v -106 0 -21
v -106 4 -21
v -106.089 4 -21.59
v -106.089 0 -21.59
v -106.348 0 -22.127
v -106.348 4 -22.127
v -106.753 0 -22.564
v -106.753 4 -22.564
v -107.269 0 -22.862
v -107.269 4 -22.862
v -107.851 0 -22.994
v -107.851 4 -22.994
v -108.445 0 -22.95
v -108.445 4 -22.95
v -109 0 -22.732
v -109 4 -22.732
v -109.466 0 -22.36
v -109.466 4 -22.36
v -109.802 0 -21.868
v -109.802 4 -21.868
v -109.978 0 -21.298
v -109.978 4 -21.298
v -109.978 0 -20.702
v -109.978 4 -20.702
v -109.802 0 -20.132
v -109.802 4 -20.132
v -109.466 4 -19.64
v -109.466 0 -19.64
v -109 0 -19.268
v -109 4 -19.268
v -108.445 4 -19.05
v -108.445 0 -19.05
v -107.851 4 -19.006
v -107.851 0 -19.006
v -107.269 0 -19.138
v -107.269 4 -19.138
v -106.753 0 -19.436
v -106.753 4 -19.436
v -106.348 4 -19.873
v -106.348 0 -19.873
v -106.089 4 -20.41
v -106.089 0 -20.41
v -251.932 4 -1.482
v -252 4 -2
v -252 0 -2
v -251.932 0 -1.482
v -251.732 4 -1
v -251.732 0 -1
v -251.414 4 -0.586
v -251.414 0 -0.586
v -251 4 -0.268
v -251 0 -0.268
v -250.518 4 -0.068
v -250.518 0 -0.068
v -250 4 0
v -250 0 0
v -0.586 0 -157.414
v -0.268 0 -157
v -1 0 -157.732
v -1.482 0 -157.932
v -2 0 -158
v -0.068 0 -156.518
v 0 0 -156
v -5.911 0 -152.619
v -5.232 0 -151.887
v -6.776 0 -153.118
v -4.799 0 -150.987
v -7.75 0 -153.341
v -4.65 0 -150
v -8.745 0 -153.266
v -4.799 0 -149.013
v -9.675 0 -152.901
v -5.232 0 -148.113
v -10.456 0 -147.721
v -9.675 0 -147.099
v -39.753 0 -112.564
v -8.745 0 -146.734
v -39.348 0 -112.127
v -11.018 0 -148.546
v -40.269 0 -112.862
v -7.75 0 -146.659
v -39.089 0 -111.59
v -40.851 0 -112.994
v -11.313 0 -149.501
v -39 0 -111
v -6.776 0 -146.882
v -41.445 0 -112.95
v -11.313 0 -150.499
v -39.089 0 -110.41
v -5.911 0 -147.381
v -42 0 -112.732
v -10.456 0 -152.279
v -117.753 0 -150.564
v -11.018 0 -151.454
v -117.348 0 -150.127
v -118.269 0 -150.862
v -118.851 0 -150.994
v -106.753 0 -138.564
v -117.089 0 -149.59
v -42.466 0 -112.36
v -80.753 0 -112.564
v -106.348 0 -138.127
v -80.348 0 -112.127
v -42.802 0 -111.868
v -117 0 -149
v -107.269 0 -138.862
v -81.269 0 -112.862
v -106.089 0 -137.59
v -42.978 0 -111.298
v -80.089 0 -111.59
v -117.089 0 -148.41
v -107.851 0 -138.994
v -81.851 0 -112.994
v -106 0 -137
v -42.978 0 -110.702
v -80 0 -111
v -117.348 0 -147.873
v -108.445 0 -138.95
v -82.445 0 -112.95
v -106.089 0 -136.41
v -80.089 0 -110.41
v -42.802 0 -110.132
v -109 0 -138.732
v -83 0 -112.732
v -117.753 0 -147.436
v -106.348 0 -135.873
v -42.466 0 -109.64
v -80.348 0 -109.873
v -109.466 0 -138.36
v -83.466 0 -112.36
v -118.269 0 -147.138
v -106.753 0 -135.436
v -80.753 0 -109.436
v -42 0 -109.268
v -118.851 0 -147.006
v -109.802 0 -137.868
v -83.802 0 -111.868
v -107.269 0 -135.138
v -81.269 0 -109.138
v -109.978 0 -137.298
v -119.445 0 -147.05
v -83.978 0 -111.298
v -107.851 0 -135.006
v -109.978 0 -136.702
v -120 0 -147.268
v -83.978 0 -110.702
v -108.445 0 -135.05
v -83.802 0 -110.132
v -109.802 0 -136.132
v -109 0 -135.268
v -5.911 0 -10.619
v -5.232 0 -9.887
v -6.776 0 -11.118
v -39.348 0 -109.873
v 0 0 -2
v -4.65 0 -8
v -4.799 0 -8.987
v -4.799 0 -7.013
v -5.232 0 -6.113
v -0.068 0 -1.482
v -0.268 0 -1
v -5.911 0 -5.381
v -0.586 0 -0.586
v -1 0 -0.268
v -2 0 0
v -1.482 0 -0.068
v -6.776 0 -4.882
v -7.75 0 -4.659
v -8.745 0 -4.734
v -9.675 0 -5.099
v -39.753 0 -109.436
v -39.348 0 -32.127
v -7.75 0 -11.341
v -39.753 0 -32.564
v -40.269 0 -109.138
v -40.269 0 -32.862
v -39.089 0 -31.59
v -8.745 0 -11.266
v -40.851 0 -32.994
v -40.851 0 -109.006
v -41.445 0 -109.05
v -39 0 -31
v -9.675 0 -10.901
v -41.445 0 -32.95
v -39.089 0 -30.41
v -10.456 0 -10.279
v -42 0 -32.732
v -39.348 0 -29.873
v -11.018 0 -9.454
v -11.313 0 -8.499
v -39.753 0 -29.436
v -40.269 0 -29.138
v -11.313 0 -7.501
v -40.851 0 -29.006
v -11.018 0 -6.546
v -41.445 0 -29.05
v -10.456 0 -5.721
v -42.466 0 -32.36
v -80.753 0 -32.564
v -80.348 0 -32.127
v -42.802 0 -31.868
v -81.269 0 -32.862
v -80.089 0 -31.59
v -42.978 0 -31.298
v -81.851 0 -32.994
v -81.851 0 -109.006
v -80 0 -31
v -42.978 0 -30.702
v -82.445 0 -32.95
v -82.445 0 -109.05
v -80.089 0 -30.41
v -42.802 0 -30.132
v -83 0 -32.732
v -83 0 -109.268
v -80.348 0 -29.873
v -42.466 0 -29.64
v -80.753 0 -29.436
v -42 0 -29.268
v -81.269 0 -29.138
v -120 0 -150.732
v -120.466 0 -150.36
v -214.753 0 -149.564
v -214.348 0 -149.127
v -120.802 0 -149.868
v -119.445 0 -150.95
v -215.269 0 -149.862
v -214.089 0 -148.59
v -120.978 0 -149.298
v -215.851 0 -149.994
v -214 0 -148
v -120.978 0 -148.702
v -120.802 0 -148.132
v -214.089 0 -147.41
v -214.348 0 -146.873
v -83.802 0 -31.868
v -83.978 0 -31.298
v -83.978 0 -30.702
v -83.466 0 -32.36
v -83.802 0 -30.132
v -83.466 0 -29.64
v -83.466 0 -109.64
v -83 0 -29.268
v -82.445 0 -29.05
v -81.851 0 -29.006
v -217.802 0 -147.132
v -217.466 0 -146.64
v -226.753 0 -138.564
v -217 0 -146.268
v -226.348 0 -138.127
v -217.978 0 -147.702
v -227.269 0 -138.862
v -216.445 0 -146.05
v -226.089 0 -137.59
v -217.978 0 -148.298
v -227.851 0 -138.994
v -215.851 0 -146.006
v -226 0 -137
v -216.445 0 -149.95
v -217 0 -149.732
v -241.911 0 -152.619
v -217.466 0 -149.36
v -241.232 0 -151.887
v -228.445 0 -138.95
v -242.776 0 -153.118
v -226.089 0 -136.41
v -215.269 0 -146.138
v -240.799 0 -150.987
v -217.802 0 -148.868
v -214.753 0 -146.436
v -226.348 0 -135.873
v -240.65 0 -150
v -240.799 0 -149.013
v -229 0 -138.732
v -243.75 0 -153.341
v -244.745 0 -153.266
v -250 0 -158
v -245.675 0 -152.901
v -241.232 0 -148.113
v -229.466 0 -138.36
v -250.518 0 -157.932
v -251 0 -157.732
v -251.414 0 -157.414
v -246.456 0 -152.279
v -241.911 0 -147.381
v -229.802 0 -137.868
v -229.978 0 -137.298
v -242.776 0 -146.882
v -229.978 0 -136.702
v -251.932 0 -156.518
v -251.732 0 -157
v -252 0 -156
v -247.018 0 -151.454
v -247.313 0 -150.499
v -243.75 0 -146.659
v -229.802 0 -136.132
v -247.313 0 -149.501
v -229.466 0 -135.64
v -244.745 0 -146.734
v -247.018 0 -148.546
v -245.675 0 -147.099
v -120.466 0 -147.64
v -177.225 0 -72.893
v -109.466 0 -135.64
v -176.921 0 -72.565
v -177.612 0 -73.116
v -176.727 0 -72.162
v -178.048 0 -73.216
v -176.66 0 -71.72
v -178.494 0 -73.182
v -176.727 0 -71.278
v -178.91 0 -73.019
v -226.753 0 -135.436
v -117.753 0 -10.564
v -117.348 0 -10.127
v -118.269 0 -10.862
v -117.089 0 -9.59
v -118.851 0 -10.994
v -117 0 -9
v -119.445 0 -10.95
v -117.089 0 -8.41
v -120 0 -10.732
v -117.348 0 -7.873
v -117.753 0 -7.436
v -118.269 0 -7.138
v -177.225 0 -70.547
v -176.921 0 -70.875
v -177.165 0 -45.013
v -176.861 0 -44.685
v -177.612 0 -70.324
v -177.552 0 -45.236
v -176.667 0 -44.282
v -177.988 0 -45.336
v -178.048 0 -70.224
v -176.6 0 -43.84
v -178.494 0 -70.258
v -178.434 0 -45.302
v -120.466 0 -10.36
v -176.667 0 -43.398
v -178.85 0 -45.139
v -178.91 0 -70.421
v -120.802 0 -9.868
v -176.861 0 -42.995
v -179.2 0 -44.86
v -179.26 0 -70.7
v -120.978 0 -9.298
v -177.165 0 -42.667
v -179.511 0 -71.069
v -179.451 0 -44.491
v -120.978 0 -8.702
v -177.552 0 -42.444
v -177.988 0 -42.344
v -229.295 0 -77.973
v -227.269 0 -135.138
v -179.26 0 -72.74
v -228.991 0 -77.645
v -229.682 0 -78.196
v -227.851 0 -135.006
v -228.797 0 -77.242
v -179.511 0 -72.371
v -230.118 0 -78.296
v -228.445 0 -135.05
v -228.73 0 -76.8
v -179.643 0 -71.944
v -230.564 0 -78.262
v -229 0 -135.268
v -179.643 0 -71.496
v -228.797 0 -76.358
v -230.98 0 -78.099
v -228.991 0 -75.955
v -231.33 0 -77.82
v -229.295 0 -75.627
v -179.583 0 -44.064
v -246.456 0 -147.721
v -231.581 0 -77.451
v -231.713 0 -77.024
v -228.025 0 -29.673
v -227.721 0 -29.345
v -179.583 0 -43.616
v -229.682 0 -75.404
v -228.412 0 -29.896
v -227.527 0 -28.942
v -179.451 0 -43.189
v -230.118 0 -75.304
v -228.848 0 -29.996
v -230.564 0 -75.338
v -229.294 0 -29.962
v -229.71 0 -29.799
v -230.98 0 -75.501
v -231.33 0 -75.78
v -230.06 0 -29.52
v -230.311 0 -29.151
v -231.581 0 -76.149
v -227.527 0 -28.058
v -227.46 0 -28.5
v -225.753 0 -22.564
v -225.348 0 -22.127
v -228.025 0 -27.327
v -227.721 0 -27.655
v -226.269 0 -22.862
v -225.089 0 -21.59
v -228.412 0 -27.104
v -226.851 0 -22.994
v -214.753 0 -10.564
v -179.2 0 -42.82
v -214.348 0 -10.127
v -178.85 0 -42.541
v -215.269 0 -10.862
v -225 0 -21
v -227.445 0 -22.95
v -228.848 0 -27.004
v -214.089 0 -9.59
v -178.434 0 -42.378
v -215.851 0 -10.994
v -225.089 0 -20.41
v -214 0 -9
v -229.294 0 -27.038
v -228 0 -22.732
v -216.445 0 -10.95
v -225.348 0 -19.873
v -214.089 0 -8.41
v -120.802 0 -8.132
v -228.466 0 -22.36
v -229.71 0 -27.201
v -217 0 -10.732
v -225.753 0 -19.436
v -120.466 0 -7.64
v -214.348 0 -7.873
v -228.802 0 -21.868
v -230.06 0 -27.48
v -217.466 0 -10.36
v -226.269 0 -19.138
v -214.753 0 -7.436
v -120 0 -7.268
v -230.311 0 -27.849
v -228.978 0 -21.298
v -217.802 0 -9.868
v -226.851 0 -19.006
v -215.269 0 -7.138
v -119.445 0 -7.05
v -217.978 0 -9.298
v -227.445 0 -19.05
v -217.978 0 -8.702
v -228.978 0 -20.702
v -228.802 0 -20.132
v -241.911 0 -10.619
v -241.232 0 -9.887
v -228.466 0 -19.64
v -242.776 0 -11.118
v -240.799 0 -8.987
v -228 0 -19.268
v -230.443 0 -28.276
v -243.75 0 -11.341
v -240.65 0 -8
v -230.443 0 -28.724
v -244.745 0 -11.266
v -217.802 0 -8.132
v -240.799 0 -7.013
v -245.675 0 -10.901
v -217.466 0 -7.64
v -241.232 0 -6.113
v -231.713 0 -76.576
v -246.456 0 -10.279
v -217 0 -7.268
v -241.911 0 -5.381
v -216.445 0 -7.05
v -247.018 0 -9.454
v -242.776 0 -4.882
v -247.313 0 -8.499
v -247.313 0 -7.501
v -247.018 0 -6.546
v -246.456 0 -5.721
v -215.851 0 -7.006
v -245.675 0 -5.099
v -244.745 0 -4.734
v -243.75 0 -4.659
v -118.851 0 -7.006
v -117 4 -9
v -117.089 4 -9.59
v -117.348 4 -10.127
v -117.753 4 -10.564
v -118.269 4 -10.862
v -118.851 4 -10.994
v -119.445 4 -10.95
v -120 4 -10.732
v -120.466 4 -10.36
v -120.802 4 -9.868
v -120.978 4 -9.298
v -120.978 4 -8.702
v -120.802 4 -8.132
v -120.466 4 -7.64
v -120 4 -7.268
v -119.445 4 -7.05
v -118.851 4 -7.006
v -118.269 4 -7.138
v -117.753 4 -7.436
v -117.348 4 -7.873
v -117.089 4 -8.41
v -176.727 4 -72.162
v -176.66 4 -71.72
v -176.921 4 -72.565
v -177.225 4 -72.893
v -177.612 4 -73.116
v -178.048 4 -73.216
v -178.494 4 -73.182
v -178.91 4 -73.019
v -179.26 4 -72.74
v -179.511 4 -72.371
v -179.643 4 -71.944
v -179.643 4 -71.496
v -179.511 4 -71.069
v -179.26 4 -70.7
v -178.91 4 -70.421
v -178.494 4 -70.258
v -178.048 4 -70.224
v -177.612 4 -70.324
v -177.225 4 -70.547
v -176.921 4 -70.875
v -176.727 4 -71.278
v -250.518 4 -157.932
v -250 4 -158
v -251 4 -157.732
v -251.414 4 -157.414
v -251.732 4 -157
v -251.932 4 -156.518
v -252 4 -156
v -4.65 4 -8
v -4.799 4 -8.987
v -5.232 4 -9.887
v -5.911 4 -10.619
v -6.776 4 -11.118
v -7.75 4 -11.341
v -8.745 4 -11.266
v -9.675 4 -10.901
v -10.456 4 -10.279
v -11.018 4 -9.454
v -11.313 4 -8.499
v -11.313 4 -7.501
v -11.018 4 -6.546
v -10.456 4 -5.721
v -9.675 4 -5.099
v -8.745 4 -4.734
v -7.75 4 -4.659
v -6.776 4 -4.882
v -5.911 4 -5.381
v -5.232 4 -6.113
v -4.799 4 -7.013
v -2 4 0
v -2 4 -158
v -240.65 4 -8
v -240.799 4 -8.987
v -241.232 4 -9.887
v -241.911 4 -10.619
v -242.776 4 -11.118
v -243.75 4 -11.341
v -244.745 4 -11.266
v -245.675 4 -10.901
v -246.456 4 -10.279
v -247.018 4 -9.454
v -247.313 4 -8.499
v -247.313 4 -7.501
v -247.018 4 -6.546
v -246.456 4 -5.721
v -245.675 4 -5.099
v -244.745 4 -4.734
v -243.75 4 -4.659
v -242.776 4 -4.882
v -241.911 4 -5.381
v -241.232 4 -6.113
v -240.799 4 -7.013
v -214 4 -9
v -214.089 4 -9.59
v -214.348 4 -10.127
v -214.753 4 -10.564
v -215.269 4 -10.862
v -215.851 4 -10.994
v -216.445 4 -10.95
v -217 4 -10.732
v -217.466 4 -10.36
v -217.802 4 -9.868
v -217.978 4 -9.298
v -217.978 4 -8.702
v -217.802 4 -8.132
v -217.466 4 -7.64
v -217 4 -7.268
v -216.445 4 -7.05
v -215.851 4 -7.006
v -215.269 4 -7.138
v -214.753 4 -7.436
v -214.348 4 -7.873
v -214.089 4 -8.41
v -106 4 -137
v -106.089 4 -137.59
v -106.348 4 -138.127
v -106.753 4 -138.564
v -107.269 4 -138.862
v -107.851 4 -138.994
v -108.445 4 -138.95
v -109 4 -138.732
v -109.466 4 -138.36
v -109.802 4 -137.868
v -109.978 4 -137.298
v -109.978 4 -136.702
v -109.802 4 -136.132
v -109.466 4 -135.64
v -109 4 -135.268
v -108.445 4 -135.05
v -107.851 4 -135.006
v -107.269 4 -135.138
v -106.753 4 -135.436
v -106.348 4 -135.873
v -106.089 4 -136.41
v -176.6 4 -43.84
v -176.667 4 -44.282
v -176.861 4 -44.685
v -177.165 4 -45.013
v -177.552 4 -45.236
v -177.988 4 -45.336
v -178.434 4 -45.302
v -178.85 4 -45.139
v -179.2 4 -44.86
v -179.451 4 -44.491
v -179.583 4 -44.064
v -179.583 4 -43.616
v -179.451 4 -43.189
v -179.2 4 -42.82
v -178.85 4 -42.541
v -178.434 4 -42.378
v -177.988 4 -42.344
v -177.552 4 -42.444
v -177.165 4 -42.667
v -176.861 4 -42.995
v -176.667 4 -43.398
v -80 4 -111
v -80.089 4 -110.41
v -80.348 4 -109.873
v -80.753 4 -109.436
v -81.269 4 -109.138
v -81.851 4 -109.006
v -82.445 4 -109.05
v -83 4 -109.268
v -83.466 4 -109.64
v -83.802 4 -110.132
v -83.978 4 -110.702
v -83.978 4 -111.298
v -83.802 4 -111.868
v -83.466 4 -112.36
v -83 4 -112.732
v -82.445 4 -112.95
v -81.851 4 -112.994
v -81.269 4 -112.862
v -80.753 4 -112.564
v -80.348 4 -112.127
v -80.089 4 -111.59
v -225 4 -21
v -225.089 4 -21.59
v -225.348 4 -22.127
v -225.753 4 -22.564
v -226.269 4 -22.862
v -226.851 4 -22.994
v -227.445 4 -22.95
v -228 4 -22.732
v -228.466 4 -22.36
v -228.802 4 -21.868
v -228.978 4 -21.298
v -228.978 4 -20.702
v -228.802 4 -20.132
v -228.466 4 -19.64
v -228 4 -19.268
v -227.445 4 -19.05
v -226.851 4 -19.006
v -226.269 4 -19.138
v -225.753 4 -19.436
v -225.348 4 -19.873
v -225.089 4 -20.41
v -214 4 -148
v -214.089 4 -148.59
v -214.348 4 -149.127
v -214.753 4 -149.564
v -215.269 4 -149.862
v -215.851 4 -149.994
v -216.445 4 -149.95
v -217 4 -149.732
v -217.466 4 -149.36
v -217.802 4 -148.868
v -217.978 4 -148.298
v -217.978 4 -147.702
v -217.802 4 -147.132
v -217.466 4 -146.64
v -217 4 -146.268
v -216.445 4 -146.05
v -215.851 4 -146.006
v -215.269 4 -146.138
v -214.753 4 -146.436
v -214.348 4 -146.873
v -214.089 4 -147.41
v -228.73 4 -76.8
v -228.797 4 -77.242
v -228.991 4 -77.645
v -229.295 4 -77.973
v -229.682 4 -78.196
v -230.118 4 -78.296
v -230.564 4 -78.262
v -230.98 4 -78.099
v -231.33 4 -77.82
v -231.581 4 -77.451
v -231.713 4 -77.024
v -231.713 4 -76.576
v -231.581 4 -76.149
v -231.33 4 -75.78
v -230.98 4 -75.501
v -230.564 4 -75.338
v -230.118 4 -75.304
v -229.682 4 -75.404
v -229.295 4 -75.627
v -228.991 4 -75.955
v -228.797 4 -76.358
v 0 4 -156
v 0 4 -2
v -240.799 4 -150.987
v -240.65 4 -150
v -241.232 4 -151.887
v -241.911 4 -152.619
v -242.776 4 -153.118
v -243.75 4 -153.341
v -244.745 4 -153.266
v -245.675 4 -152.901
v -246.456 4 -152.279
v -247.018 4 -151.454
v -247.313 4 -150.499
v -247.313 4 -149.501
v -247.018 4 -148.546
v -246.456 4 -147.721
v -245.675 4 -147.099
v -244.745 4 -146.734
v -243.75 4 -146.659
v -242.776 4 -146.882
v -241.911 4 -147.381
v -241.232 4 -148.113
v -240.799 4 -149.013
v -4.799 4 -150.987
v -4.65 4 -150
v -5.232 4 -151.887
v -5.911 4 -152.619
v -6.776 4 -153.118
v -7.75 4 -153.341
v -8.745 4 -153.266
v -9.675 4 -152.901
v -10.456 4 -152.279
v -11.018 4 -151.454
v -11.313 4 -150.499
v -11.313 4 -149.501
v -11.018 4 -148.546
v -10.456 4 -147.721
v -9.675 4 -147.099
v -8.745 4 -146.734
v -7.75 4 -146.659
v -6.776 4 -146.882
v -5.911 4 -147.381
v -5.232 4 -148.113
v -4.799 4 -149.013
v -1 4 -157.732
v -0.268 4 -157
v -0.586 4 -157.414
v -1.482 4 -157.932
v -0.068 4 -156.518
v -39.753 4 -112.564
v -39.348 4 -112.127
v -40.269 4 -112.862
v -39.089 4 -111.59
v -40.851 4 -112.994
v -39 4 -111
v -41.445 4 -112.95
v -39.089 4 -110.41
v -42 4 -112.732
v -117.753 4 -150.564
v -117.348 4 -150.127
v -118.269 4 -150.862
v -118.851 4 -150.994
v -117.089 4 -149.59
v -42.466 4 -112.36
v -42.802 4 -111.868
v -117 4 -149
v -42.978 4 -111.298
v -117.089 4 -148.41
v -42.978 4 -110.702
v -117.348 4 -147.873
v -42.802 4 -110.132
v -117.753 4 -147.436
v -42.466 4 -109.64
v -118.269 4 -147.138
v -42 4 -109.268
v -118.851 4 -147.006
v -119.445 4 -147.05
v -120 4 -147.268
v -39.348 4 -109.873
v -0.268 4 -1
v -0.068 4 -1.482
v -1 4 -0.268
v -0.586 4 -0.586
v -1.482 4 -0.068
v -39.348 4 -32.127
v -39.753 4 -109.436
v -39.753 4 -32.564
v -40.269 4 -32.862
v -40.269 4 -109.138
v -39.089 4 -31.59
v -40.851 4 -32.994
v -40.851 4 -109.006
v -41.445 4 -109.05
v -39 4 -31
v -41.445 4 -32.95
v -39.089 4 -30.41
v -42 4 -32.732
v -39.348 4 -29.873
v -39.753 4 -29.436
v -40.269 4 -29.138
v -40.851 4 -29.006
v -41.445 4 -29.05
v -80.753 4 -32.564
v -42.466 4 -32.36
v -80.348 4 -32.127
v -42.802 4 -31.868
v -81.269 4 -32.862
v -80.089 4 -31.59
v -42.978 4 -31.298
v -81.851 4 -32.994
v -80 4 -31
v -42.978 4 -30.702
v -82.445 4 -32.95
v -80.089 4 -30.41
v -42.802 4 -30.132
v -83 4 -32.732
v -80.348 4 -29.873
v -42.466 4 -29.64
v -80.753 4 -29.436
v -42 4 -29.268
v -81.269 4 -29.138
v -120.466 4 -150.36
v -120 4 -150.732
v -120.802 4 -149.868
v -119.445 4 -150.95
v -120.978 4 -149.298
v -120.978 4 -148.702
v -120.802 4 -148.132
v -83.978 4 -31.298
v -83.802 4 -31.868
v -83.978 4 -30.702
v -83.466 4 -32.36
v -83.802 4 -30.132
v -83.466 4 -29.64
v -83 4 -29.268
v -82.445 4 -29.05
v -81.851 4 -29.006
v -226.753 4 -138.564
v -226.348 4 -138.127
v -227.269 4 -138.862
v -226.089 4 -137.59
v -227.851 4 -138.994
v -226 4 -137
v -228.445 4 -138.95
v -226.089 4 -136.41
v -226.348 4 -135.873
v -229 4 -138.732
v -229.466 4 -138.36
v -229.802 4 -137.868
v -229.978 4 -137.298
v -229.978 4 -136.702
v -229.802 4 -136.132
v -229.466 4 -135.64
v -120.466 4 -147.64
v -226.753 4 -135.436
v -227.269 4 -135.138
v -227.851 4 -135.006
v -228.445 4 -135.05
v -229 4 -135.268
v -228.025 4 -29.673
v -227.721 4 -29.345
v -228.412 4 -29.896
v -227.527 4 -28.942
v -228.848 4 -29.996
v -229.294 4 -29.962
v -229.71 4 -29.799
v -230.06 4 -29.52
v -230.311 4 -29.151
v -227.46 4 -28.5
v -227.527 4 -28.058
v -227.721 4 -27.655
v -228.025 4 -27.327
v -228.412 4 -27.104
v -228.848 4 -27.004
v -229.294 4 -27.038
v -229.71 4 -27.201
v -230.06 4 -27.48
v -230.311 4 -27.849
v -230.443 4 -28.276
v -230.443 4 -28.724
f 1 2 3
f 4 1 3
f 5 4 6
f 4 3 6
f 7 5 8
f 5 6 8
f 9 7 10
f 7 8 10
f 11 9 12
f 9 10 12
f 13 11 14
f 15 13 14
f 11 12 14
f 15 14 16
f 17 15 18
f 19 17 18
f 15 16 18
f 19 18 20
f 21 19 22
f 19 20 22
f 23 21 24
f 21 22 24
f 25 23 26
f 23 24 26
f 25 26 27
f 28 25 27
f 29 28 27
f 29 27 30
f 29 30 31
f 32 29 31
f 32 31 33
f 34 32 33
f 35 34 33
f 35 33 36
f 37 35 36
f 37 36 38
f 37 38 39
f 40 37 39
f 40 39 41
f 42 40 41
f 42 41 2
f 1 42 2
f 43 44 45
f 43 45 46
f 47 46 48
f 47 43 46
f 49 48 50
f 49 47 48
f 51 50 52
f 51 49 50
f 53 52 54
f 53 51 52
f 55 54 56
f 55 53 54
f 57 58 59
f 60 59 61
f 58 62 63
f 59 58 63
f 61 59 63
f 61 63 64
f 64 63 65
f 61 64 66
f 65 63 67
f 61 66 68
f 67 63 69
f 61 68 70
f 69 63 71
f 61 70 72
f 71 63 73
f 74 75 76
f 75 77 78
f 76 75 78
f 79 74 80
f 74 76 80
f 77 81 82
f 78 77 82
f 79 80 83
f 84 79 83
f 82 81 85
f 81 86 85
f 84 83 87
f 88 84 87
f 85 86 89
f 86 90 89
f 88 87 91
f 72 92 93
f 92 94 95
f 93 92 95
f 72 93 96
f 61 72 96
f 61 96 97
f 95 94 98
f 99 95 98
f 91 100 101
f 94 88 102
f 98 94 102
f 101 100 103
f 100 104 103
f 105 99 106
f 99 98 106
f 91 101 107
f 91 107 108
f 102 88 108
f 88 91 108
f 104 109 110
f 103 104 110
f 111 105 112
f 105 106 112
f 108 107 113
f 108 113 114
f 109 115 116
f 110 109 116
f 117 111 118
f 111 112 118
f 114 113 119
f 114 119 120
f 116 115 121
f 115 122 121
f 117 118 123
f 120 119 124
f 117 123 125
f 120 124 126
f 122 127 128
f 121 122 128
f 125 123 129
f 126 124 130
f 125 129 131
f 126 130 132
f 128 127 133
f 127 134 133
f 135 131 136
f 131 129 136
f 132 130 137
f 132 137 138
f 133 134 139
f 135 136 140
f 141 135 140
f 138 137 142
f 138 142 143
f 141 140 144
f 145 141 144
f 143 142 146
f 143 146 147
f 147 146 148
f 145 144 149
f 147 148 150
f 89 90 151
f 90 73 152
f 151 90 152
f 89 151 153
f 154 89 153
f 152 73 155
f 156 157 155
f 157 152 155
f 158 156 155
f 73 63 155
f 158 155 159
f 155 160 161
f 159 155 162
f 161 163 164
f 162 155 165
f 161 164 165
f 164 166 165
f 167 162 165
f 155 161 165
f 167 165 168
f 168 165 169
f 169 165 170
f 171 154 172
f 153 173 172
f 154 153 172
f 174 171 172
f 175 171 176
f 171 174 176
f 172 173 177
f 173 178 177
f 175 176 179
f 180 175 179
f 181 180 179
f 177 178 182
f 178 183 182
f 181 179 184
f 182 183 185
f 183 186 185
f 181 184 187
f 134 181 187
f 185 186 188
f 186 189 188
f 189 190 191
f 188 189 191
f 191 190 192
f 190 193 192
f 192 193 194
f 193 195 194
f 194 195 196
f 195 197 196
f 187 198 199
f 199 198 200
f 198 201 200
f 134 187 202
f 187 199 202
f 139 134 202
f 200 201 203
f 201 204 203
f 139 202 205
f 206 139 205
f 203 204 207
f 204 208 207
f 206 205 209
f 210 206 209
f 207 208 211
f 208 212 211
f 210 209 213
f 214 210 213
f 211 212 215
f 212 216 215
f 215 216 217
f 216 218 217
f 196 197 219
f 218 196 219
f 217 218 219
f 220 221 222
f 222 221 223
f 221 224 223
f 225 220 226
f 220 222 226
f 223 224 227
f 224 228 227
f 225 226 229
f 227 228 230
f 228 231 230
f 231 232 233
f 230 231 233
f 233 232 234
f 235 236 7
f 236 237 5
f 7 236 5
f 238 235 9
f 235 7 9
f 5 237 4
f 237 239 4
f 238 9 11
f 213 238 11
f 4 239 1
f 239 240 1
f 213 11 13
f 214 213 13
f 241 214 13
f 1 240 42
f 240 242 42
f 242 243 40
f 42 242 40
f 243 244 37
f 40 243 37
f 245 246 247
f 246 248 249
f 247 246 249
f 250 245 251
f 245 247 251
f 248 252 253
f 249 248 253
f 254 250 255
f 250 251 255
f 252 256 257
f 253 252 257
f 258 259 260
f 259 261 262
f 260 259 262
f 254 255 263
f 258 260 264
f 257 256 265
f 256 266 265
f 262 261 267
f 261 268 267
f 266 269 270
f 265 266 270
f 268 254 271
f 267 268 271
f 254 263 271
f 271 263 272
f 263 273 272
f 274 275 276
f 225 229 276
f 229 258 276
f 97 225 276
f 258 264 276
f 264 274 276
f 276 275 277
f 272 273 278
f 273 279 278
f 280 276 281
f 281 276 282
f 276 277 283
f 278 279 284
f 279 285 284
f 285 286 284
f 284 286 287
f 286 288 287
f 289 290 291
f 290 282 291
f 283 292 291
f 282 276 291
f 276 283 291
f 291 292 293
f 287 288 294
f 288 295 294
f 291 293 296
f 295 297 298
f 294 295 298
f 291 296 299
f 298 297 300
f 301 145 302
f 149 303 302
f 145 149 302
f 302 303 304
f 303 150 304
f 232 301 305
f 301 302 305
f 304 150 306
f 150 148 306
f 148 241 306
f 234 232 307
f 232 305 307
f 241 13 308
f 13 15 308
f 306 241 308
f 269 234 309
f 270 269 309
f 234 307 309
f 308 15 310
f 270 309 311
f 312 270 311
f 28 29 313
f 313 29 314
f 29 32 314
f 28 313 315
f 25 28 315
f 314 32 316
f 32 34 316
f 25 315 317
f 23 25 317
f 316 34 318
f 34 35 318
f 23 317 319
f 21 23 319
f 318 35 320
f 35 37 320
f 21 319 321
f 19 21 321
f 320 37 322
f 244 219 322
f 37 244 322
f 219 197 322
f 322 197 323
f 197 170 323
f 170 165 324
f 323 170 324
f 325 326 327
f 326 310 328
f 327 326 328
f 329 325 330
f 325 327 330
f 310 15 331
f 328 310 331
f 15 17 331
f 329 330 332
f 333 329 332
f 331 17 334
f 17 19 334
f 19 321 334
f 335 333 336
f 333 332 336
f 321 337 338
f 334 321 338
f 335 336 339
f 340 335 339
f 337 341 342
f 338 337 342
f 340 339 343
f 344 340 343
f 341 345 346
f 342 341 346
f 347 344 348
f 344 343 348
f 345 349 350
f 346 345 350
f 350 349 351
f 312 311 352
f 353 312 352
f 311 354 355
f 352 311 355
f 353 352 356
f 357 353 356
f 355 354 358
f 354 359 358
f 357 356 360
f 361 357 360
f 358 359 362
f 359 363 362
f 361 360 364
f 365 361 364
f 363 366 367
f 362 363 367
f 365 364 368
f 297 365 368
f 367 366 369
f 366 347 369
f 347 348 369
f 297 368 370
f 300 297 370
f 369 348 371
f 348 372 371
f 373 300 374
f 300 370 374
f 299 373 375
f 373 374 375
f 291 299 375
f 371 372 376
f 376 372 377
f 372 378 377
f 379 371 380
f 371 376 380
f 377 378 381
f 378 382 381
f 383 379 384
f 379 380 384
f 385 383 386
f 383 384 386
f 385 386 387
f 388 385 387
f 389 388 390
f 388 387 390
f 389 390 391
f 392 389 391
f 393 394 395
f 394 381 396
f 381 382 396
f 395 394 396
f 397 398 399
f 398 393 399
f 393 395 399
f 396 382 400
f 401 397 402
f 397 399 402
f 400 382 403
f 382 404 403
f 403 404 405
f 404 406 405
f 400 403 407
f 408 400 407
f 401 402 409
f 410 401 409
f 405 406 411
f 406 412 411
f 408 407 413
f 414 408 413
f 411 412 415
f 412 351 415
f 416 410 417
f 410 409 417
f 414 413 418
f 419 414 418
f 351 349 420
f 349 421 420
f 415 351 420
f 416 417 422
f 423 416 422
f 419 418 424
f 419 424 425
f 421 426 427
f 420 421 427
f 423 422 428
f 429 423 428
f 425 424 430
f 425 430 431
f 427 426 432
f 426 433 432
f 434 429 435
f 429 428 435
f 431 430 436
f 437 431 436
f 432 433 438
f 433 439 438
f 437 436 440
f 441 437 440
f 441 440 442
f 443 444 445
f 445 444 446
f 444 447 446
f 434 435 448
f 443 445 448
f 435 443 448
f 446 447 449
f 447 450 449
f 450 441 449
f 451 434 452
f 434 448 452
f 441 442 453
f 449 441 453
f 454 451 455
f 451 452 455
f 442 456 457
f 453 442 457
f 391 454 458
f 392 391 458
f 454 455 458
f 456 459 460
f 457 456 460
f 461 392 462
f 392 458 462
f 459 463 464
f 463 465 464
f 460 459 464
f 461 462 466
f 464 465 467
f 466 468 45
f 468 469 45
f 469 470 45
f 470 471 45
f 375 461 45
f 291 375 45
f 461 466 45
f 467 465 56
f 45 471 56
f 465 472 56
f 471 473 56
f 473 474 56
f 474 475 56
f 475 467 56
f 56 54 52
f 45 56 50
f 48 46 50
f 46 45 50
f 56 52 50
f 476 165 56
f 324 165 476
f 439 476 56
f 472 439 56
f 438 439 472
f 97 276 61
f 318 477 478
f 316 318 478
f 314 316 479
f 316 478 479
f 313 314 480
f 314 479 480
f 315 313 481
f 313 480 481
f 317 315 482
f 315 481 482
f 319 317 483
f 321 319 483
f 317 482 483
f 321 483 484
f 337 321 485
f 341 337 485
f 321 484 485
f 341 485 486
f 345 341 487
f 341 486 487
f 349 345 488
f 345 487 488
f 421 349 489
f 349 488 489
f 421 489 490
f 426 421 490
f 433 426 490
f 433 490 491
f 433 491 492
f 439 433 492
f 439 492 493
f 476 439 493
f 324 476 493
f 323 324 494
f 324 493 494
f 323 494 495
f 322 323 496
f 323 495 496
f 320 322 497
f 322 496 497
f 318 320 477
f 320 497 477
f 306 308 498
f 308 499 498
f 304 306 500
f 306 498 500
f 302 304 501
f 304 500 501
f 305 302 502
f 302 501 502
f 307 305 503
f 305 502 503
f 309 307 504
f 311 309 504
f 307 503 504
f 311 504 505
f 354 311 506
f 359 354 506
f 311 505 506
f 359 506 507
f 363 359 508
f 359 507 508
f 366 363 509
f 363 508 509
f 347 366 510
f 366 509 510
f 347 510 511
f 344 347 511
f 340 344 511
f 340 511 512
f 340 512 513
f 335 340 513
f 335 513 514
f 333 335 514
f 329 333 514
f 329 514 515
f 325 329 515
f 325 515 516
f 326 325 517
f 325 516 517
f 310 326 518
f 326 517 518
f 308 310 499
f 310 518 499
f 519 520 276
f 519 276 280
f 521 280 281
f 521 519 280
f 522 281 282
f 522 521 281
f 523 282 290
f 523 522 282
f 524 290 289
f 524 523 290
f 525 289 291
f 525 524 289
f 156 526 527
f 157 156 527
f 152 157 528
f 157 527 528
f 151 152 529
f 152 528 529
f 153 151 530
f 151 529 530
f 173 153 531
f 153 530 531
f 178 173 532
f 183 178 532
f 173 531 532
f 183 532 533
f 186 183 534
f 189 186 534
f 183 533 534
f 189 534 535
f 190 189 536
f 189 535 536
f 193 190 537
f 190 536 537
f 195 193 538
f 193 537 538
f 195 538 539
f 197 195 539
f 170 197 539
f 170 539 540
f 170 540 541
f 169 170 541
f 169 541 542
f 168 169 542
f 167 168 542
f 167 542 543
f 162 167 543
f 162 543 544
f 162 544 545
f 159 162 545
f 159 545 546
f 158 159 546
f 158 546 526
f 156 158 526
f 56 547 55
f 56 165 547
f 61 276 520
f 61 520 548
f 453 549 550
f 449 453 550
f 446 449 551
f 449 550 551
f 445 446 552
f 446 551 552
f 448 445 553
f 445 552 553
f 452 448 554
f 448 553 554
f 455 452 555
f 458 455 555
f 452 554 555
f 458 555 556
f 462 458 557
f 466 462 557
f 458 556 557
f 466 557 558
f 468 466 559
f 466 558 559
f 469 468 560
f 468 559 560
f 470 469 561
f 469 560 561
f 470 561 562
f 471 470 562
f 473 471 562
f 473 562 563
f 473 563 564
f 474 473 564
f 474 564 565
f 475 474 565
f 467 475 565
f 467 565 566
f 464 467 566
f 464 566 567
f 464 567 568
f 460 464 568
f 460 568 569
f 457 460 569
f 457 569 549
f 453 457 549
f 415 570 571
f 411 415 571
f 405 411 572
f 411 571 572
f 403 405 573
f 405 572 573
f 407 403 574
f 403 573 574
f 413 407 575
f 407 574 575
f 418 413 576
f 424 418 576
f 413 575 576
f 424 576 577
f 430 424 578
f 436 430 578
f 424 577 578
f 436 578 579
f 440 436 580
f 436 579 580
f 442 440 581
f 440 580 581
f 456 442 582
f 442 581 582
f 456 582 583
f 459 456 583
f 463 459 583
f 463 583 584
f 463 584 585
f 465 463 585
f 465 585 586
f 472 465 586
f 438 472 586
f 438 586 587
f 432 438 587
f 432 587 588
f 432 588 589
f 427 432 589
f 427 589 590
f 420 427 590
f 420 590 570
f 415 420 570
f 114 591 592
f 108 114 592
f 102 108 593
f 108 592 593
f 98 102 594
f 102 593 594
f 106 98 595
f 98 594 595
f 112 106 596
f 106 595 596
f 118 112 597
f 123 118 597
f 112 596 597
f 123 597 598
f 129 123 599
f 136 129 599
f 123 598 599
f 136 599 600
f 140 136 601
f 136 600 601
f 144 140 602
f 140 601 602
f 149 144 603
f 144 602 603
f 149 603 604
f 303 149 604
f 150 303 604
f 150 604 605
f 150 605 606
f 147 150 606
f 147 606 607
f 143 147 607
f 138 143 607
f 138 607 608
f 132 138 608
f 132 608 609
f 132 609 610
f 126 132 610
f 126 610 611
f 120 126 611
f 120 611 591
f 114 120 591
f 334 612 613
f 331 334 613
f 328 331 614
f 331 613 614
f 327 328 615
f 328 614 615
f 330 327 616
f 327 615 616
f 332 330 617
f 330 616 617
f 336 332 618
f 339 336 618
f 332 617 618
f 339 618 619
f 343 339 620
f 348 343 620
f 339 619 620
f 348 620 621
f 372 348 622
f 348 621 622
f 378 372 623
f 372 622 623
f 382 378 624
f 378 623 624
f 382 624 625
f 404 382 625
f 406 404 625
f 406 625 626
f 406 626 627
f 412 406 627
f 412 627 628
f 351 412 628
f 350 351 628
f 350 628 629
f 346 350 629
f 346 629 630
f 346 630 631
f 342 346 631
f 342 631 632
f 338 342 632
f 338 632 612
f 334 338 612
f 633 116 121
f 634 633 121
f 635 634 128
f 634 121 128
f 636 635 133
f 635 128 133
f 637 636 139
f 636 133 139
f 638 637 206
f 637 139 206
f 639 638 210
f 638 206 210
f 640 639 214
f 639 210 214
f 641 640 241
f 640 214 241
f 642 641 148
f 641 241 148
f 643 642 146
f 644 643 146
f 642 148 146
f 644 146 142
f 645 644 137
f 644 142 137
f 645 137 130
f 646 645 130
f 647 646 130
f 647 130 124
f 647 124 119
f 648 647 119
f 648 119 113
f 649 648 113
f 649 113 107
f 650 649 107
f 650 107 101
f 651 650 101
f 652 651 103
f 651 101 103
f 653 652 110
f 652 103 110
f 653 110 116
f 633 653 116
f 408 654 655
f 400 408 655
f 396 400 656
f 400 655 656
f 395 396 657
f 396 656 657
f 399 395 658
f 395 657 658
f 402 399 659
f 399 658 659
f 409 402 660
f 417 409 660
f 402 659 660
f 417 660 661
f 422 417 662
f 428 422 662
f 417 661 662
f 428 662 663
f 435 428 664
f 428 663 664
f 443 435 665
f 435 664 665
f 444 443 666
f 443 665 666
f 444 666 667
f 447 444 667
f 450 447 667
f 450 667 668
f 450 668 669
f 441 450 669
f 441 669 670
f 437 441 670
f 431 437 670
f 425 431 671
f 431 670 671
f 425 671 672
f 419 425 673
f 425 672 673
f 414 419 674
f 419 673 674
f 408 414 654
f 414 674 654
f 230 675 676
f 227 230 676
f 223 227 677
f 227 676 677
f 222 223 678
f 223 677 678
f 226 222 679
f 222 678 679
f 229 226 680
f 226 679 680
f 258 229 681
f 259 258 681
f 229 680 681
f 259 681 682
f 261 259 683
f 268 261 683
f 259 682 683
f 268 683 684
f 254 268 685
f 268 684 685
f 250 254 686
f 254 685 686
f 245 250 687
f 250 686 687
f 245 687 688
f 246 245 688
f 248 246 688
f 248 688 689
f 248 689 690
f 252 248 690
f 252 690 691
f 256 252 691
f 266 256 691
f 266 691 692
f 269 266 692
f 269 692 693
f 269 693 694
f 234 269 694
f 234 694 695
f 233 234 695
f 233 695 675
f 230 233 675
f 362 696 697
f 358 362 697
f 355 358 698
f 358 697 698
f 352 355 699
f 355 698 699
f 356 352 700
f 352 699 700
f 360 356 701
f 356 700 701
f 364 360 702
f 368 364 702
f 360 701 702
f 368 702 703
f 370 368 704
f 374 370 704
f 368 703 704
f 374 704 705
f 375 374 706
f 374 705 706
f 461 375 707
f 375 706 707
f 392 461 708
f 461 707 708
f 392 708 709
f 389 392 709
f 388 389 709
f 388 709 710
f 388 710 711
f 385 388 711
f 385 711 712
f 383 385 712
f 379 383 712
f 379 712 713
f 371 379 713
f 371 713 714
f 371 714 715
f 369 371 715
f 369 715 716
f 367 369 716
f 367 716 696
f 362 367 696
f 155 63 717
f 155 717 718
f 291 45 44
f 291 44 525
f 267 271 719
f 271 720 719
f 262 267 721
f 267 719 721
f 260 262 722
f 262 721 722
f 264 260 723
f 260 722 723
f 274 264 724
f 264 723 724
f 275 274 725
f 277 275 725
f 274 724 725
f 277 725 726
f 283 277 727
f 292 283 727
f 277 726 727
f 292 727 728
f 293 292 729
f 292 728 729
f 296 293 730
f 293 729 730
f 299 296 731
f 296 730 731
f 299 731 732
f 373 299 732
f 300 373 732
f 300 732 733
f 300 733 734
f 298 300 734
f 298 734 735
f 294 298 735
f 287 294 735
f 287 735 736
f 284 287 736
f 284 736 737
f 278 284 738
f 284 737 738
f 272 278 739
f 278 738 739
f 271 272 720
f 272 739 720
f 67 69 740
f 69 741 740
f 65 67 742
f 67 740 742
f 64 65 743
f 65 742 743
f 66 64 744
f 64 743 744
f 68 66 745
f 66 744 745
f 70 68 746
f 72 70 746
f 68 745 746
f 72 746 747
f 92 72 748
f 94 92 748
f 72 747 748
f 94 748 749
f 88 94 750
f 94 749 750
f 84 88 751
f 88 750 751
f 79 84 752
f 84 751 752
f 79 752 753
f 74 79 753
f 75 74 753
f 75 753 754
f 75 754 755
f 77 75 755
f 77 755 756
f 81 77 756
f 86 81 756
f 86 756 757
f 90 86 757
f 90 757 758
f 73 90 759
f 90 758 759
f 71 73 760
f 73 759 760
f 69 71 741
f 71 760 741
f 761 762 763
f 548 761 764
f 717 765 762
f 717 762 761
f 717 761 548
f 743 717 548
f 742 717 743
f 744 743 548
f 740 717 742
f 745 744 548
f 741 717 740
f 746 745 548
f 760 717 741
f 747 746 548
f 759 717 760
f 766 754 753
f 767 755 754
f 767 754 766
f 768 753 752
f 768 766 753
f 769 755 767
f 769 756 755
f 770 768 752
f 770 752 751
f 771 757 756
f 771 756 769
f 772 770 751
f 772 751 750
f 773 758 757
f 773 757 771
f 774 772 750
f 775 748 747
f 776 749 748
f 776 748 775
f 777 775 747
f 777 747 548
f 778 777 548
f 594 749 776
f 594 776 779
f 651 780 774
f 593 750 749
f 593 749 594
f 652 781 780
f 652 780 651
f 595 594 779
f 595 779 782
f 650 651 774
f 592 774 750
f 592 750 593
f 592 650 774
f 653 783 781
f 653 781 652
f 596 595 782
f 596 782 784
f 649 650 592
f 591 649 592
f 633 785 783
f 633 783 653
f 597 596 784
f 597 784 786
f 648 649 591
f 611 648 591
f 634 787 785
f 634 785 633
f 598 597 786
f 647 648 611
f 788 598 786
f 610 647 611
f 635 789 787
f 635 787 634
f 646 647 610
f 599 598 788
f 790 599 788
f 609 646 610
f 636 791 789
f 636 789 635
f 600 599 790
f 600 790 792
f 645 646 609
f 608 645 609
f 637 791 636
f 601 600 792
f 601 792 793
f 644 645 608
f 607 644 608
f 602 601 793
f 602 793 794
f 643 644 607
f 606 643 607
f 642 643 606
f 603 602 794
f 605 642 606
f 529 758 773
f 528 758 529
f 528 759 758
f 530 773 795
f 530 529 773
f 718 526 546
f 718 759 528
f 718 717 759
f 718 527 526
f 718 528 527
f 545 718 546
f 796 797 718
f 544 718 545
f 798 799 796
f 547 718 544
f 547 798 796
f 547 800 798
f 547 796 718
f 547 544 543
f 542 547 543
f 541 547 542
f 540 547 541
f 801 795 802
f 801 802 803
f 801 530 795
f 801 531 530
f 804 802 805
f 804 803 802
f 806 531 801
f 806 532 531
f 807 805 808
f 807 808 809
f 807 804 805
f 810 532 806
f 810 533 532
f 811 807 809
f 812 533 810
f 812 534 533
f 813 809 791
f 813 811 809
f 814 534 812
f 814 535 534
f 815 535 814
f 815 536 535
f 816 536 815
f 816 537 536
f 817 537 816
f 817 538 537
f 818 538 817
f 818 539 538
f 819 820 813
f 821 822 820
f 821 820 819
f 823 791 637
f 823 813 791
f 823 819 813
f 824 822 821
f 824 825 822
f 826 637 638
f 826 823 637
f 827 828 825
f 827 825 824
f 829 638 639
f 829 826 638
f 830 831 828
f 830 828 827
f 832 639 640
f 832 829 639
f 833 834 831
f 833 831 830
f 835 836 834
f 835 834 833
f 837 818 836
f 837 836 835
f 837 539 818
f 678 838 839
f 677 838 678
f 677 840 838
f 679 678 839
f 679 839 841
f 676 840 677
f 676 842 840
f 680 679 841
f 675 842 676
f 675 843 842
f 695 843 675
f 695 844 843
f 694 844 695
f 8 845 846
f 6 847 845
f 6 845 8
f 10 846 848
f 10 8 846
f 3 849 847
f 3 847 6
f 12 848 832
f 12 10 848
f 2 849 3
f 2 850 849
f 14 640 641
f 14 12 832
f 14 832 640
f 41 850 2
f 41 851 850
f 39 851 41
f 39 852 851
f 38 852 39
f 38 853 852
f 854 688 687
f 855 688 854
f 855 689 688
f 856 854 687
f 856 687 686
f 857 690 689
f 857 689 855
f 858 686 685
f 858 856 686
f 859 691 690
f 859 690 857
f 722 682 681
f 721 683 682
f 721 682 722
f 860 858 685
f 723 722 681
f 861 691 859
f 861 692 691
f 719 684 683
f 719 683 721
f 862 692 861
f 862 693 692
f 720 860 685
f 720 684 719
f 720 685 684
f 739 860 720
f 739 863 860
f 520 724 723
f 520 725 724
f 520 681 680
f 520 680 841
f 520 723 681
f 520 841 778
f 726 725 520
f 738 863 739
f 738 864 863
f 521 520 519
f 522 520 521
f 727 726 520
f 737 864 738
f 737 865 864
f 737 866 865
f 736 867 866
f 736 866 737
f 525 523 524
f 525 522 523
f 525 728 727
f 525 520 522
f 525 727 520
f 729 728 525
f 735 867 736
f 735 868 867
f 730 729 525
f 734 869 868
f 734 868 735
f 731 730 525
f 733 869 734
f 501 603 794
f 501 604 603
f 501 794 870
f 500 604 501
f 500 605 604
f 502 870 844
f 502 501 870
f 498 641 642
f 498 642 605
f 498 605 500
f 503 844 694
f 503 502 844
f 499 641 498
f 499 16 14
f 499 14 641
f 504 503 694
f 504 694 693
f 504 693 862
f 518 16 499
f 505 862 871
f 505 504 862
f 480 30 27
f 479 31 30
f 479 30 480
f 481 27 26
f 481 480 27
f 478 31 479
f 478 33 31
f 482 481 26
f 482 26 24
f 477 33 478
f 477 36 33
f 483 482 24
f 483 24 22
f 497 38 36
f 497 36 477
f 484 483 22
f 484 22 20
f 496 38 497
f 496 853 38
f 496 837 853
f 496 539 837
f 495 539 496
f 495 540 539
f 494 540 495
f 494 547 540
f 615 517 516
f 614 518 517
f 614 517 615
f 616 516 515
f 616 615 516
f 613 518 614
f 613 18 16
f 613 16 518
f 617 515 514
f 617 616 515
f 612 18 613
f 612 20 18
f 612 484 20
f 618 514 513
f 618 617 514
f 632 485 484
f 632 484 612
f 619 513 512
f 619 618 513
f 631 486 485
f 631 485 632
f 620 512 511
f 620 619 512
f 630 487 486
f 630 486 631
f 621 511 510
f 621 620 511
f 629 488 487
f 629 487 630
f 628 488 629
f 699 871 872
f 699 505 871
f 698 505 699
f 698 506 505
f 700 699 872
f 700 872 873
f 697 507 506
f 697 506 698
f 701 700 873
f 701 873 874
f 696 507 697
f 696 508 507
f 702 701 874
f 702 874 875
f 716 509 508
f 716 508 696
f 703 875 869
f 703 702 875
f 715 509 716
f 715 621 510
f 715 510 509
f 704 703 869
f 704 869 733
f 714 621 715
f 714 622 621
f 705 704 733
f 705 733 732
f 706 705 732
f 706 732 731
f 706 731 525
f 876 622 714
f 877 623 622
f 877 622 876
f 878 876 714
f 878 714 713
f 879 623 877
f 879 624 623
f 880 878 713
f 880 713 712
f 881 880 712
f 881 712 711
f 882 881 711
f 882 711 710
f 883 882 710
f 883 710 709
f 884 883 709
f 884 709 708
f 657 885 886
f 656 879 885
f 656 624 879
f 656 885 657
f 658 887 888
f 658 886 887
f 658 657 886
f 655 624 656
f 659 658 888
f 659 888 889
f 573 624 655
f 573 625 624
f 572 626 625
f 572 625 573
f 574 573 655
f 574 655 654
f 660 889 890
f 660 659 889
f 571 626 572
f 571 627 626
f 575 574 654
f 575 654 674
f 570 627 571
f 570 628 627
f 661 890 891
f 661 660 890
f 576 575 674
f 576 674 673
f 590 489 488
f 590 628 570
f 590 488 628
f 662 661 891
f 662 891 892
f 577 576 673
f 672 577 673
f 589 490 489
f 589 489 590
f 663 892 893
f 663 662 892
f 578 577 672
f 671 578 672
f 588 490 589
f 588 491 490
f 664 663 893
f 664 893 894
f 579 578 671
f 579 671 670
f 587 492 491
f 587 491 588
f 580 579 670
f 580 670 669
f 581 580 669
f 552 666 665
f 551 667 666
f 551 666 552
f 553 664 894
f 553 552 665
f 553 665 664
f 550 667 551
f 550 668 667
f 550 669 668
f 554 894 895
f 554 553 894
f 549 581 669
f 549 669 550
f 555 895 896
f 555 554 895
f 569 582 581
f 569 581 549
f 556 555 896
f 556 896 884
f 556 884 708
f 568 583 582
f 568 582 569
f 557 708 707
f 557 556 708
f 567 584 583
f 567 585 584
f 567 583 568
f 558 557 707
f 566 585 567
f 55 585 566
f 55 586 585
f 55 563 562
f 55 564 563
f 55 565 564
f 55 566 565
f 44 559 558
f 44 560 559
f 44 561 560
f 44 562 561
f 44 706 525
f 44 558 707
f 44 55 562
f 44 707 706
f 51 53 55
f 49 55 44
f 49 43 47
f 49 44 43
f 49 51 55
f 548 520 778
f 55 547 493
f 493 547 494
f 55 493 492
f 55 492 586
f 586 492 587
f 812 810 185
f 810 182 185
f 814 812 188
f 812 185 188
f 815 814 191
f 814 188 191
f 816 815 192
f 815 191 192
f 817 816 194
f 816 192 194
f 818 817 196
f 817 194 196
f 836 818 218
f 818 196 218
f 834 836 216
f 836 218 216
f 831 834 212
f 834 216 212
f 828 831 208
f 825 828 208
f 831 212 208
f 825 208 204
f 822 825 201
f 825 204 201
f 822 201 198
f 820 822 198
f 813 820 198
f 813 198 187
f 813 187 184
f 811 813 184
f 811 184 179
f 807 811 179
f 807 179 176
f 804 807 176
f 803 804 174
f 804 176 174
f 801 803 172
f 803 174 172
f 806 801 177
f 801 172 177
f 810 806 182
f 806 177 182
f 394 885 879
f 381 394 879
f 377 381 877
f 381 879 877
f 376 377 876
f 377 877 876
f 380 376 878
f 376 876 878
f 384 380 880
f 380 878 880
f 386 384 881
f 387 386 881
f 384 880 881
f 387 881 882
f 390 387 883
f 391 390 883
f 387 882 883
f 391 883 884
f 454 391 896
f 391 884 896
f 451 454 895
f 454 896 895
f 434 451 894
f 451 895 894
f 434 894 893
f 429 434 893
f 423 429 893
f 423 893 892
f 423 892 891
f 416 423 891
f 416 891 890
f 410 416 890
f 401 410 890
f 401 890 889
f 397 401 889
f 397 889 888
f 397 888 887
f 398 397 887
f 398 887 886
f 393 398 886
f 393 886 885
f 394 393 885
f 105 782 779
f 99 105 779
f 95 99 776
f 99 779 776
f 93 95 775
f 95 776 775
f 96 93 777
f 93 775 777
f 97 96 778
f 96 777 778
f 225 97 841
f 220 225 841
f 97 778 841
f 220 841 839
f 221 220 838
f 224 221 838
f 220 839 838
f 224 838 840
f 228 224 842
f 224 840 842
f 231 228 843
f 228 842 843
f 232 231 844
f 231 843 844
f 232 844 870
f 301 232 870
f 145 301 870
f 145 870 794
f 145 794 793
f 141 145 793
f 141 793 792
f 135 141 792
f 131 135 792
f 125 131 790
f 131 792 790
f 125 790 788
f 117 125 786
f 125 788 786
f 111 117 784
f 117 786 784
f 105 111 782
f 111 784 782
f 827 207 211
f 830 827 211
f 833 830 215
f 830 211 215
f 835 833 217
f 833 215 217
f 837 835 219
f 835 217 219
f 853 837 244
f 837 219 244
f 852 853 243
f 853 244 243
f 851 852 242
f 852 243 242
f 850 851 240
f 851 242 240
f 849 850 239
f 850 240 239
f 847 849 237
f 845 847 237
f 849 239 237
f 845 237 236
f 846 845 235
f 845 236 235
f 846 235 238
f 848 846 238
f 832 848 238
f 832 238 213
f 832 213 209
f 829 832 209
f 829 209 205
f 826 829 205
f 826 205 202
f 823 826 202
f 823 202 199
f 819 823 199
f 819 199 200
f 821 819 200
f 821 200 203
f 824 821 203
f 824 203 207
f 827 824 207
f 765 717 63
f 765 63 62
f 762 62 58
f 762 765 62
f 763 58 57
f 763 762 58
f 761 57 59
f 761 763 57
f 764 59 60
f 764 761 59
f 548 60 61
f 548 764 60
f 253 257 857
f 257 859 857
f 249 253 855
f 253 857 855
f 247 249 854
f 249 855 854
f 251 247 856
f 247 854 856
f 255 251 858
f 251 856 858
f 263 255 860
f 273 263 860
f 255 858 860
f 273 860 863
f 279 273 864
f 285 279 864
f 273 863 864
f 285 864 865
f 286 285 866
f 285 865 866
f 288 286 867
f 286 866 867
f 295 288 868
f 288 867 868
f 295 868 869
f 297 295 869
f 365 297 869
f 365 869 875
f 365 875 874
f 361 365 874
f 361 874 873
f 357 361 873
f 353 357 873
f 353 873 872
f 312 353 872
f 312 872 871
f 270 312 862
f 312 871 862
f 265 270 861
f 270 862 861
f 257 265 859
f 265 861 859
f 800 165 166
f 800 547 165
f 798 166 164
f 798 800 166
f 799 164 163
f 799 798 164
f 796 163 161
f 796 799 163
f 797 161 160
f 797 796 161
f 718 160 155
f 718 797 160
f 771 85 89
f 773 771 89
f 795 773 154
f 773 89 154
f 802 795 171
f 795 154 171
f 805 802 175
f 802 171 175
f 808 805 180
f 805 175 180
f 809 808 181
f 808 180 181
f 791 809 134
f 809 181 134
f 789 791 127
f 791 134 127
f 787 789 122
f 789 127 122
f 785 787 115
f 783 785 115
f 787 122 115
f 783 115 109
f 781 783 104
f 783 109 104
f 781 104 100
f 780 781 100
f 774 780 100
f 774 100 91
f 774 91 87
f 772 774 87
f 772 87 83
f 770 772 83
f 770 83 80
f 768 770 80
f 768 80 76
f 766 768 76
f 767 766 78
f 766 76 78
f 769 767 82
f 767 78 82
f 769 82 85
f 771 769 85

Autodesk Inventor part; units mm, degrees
ref_plane "YZ Plane" through (0, 0, 0) normal (1, 0, 0) x (0, 1, 0)
ref_plane "XZ Plane" through (0, 0, 0) normal (0, 1, 0) x (-1, 0, 0)
ref_plane "XY Plane" through (0, 0, 0) normal (0, 0, 1) x (1, 0, 0)
sketch "Esboço1" plane through (0, 0, 0) normal (0, 1, 0) x (-1, 0, 0)
  line L0 (0, 0) -> (252, 0)
  line L1 (252, 0) -> (252, -158)
  line L2 (252, -158) -> (0, -158)
  line L3 (0, -158) -> (0, 0)
  dimension "d0" = 252
  dimension "d1" = 158
extrude "Extrusão1" add sketch "Esboço1" along normal blind 4
fillet "Arredondamento1" radius 2 4 edges at (0, 2, 0) (0, 2, -158) (-252, 2, 0) (-252, 2, -158)
sketch "Esboço2" plane through (0, 4, 0) normal (0, 1, 0) x (1, 0, 0)
  circle A0 centre (-244, 150) radius 3.35
  circle A1 centre (-244, 8) radius 3.35
  circle A2 centre (-8, 150) radius 3.35
  circle A3 centre (-8, 8) radius 3.35
  line L0 (-252, 156) -> (-252, 2) projected
  line L1 (-2, 158) -> (-250, 158) projected
  line L2 (-250, 0) -> (-2, 0) projected
  line L3 (0, 2) -> (0, 156) projected
  point P0 (0, 0)
  dimension "d5" = 6.7
  dimension "d6" = 6.7
  dimension "d7" = 6.7
  dimension "d8" = 6.7
  dimension "d9" = 8
  dimension "d10" = 8
  dimension "d11" = 8
  dimension "d12" = 8
  dimension "d13" = 8
  dimension "d14" = 8
  dimension "d15" = 8
  dimension "d16" = 8
extrude "Extrusão2" cut sketch "Esboço2" against normal blind 10
sketch "Esboço3" plane through (0, 0, 0) normal (0, -1, 0) x (1, 0, 0)
  line L0 (-14.2, -140.75) -> (-87.5029, -140.75) projected
  arc A0 (-89.0029, -139.25) -> (-87.5029, -140.75) centre (-87.5029, -139.25) ccw projected
  line L1 (-89.0029, -130.5) -> (-89.0029, -139.25) projected
  line L2 (-89.0029, -130.5) -> (-89.0029, -10.5) projected
  line L3 (-89.0029, -1.75) -> (-89.0029, -10.5) projected
  arc A1 (-87.5029, -0.25) -> (-89.0029, -1.75) centre (-87.5029, -1.75) ccw projected
  line L4 (-87.5029, -0.25) -> (-14.2, -0.25) projected
  line L5 (-14.2, -140.75) -> (-14.2, -0.25) projected
  circle A2 centre (-31, -21) radius 2 projected
  circle A3 centre (-31, -21) radius 4 projected
  circle A4 centre (-41, -31) radius 2 projected
  circle A5 centre (-31, -21) radius 2 projected
  circle A6 centre (-31, -121) radius 4.5 projected
  circle A7 centre (-82, -111) radius 2 projected
  circle A8 centre (-41, -111) radius 2 projected
  circle A9 centre (-72, -121) radius 2 projected
  circle A10 centre (-72, -121) radius 4.5 projected
  circle A11 centre (-41, -31) radius 2 projected
  circle A12 centre (-82, -31) radius 2 projected
  circle A13 centre (-72, -21) radius 2 projected
  circle A14 centre (-72, -21) radius 4.5 projected
  point P0 (0, 0)
extrude "Extrusão3" cut sketch "Esboço3" against normal blind 10 contours A4 | A7 | A8 | A12
sketch "Esboço4" plane through (0, 4, 0) normal (0, 1, 0) x (1, 0, 0)
  circle A0 centre (-216, 148) radius 2 projected
  circle A1 centre (-108, 137) radius 2 projected
  circle A2 centre (-119, 149) radius 2 projected
  circle A3 centre (-228, 137) radius 2 projected
  circle A4 centre (-227, 21) radius 2 projected
  circle A5 centre (-216, 9) radius 2 projected
  circle A6 centre (-108, 21) radius 2 projected
  circle A7 centre (-119, 9) radius 2 projected
  point P0 (0, 0)
  point P1 (-122.4, 150.963)
extrude "Extrusão4" cut sketch "Esboço4" against normal blind 10
sketch "Esboço5" plane through (0, 4, 0) normal (0, 1, 0) x (1, 0, 0)
  circle A0 centre (-178.16, 71.72) radius 1.5 projected
  circle A1 centre (-178.1, 43.84) radius 1.5 projected
  circle A2 centre (-228.96, 28.5) radius 1.5 projected
  circle A3 centre (-230.23, 76.8) radius 1.5 projected
  point P0 (0, 0)
extrude "Extrusão5" cut sketch "Esboço5" against normal blind 10
equation "\"d8\" = d6"
equation "\"d10\" = d12"
equation "\"d11\" = d10"
equation "\"d12\" = d9"
equation "\"d13\" = d12"
equation "\"d14\" = d13"
equation "\"d15\" = d13"
equation "\"d16\" = d15"
properties part number "Base"
